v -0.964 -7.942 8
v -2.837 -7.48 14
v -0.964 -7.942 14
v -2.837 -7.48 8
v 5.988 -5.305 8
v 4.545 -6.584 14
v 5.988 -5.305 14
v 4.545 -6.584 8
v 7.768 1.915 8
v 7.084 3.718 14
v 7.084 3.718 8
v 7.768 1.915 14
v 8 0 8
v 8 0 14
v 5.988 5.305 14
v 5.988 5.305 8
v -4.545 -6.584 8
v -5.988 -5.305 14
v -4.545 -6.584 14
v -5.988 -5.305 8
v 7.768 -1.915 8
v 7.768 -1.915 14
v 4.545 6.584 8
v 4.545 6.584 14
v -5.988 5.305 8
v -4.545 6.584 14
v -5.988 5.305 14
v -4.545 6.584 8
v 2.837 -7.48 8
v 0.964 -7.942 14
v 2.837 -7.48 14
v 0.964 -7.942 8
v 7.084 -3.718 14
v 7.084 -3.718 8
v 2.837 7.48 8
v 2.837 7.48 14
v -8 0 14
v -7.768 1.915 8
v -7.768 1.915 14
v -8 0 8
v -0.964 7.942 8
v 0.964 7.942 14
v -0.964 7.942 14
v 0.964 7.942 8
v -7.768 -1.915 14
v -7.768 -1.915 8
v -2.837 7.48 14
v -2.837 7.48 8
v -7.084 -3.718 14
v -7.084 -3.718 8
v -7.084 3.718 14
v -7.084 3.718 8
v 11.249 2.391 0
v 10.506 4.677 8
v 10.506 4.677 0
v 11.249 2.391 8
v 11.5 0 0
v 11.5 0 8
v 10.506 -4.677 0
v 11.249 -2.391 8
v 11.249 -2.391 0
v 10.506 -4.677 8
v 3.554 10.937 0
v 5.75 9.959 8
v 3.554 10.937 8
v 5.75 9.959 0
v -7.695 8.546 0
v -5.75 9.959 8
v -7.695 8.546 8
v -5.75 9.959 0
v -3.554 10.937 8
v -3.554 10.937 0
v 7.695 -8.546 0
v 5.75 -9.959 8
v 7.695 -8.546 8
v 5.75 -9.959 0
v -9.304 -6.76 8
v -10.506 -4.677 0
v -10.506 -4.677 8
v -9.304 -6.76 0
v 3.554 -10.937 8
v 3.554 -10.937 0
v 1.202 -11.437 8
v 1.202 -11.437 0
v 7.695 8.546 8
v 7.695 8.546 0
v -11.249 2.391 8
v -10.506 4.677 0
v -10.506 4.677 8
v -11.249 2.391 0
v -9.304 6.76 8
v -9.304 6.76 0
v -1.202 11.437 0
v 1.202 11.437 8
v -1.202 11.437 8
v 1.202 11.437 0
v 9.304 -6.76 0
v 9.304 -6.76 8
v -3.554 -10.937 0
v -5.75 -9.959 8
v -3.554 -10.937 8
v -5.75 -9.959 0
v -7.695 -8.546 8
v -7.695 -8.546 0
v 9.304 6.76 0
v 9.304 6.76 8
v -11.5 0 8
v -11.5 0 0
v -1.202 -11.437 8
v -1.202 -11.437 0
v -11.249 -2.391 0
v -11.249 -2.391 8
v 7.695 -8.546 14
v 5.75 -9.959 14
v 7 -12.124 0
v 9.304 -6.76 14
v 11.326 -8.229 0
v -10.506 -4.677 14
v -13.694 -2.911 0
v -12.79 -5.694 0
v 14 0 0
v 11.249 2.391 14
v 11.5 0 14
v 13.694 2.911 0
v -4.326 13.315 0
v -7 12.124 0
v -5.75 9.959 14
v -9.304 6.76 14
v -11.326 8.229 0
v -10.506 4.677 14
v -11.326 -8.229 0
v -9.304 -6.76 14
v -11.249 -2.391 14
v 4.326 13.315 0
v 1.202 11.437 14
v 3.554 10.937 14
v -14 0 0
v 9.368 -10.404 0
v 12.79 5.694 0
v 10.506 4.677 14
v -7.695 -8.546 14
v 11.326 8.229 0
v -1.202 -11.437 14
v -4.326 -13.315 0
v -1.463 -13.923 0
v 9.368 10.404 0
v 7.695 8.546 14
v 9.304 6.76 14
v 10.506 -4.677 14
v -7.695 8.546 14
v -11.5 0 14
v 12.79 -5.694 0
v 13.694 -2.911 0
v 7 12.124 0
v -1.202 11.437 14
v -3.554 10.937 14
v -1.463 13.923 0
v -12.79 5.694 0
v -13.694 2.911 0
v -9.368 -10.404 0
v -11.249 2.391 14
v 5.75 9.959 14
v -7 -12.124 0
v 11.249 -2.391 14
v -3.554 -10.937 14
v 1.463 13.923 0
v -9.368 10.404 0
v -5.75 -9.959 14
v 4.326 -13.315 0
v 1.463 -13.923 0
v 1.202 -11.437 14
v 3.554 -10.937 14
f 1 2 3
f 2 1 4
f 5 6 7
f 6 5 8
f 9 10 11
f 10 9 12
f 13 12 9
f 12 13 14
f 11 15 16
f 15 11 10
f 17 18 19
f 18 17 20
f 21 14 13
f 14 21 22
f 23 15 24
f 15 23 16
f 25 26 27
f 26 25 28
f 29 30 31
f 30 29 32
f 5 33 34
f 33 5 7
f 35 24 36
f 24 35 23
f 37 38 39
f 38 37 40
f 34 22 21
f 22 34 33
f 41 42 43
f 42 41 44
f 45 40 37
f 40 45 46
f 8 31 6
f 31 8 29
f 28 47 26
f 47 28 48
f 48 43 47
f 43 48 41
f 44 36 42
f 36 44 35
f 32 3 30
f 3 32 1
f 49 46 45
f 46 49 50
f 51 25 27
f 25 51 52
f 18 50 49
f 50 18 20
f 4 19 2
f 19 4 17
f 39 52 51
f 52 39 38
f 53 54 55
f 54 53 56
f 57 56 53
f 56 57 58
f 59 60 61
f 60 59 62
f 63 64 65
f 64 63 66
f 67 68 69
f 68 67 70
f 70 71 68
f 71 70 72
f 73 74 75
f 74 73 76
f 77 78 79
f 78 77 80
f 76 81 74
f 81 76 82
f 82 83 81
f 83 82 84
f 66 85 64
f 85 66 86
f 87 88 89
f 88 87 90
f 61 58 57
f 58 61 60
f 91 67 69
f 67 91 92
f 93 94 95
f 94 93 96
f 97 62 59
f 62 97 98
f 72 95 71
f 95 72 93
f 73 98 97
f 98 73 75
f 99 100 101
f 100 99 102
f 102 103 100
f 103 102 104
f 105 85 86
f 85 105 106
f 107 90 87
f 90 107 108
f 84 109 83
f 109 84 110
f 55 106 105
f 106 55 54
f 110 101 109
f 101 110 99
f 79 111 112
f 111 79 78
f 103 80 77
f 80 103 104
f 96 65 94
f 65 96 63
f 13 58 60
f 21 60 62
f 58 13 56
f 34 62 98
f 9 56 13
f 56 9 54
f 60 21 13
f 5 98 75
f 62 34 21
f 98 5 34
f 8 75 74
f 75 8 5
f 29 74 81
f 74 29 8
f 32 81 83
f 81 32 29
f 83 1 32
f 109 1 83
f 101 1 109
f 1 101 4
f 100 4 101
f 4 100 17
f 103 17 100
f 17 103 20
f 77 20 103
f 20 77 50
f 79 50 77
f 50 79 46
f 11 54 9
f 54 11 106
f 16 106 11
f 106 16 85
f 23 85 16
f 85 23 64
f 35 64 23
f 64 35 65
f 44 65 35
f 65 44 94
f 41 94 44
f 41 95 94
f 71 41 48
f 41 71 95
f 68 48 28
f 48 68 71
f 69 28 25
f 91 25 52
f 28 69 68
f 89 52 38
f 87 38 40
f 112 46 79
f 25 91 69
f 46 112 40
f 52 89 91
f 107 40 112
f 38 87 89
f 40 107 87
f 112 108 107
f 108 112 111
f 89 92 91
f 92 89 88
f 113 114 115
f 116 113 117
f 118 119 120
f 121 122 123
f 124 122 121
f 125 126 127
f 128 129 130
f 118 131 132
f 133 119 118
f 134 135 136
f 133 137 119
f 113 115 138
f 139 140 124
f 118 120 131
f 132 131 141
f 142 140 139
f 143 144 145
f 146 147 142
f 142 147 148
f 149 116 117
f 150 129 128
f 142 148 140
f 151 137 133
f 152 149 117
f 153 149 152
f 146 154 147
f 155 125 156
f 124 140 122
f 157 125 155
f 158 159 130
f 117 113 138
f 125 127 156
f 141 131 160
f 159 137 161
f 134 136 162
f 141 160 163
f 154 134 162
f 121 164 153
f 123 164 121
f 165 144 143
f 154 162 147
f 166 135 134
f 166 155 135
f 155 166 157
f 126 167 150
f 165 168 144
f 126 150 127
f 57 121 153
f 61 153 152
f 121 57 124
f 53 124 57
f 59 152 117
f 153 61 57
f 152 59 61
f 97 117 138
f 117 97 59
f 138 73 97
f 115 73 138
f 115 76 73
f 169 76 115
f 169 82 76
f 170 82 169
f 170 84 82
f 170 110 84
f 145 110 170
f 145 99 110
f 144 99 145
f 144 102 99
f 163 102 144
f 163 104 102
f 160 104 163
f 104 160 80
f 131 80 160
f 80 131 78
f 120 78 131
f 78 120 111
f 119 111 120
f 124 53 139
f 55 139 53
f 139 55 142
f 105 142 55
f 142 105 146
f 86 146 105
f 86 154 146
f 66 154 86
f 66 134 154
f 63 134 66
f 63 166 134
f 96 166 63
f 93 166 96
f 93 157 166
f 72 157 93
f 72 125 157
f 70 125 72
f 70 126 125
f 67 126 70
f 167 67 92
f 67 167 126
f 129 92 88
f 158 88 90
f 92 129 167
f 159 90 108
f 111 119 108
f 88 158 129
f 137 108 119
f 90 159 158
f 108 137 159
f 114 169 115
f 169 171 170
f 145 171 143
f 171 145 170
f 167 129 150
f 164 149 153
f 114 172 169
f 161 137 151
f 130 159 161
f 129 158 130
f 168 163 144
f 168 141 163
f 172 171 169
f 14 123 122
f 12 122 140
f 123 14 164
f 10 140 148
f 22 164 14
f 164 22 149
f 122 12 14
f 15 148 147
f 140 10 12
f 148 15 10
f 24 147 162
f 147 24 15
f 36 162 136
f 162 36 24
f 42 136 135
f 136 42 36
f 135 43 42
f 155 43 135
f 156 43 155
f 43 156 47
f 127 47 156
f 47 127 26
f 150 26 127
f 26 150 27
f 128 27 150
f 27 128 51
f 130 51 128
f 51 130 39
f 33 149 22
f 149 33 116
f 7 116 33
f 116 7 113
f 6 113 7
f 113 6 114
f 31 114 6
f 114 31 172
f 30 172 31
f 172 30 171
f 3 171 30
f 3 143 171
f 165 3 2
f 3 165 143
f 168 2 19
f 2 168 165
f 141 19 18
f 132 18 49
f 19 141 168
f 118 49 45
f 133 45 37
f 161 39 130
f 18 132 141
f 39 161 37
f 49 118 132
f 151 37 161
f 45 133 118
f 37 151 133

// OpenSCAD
hole_d = 16;
d2 = 23;
d1 = 28;
h = 7;
H = 2 * h;

difference(){
  cylinder(d1=d1, d2=d2, h=H);
  translate([0, 0, -1]){
    cylinder(d=hole_d, h=H+2);
    cylinder(d1=d2, d2=d2, h=h+2);
  }
  
}
